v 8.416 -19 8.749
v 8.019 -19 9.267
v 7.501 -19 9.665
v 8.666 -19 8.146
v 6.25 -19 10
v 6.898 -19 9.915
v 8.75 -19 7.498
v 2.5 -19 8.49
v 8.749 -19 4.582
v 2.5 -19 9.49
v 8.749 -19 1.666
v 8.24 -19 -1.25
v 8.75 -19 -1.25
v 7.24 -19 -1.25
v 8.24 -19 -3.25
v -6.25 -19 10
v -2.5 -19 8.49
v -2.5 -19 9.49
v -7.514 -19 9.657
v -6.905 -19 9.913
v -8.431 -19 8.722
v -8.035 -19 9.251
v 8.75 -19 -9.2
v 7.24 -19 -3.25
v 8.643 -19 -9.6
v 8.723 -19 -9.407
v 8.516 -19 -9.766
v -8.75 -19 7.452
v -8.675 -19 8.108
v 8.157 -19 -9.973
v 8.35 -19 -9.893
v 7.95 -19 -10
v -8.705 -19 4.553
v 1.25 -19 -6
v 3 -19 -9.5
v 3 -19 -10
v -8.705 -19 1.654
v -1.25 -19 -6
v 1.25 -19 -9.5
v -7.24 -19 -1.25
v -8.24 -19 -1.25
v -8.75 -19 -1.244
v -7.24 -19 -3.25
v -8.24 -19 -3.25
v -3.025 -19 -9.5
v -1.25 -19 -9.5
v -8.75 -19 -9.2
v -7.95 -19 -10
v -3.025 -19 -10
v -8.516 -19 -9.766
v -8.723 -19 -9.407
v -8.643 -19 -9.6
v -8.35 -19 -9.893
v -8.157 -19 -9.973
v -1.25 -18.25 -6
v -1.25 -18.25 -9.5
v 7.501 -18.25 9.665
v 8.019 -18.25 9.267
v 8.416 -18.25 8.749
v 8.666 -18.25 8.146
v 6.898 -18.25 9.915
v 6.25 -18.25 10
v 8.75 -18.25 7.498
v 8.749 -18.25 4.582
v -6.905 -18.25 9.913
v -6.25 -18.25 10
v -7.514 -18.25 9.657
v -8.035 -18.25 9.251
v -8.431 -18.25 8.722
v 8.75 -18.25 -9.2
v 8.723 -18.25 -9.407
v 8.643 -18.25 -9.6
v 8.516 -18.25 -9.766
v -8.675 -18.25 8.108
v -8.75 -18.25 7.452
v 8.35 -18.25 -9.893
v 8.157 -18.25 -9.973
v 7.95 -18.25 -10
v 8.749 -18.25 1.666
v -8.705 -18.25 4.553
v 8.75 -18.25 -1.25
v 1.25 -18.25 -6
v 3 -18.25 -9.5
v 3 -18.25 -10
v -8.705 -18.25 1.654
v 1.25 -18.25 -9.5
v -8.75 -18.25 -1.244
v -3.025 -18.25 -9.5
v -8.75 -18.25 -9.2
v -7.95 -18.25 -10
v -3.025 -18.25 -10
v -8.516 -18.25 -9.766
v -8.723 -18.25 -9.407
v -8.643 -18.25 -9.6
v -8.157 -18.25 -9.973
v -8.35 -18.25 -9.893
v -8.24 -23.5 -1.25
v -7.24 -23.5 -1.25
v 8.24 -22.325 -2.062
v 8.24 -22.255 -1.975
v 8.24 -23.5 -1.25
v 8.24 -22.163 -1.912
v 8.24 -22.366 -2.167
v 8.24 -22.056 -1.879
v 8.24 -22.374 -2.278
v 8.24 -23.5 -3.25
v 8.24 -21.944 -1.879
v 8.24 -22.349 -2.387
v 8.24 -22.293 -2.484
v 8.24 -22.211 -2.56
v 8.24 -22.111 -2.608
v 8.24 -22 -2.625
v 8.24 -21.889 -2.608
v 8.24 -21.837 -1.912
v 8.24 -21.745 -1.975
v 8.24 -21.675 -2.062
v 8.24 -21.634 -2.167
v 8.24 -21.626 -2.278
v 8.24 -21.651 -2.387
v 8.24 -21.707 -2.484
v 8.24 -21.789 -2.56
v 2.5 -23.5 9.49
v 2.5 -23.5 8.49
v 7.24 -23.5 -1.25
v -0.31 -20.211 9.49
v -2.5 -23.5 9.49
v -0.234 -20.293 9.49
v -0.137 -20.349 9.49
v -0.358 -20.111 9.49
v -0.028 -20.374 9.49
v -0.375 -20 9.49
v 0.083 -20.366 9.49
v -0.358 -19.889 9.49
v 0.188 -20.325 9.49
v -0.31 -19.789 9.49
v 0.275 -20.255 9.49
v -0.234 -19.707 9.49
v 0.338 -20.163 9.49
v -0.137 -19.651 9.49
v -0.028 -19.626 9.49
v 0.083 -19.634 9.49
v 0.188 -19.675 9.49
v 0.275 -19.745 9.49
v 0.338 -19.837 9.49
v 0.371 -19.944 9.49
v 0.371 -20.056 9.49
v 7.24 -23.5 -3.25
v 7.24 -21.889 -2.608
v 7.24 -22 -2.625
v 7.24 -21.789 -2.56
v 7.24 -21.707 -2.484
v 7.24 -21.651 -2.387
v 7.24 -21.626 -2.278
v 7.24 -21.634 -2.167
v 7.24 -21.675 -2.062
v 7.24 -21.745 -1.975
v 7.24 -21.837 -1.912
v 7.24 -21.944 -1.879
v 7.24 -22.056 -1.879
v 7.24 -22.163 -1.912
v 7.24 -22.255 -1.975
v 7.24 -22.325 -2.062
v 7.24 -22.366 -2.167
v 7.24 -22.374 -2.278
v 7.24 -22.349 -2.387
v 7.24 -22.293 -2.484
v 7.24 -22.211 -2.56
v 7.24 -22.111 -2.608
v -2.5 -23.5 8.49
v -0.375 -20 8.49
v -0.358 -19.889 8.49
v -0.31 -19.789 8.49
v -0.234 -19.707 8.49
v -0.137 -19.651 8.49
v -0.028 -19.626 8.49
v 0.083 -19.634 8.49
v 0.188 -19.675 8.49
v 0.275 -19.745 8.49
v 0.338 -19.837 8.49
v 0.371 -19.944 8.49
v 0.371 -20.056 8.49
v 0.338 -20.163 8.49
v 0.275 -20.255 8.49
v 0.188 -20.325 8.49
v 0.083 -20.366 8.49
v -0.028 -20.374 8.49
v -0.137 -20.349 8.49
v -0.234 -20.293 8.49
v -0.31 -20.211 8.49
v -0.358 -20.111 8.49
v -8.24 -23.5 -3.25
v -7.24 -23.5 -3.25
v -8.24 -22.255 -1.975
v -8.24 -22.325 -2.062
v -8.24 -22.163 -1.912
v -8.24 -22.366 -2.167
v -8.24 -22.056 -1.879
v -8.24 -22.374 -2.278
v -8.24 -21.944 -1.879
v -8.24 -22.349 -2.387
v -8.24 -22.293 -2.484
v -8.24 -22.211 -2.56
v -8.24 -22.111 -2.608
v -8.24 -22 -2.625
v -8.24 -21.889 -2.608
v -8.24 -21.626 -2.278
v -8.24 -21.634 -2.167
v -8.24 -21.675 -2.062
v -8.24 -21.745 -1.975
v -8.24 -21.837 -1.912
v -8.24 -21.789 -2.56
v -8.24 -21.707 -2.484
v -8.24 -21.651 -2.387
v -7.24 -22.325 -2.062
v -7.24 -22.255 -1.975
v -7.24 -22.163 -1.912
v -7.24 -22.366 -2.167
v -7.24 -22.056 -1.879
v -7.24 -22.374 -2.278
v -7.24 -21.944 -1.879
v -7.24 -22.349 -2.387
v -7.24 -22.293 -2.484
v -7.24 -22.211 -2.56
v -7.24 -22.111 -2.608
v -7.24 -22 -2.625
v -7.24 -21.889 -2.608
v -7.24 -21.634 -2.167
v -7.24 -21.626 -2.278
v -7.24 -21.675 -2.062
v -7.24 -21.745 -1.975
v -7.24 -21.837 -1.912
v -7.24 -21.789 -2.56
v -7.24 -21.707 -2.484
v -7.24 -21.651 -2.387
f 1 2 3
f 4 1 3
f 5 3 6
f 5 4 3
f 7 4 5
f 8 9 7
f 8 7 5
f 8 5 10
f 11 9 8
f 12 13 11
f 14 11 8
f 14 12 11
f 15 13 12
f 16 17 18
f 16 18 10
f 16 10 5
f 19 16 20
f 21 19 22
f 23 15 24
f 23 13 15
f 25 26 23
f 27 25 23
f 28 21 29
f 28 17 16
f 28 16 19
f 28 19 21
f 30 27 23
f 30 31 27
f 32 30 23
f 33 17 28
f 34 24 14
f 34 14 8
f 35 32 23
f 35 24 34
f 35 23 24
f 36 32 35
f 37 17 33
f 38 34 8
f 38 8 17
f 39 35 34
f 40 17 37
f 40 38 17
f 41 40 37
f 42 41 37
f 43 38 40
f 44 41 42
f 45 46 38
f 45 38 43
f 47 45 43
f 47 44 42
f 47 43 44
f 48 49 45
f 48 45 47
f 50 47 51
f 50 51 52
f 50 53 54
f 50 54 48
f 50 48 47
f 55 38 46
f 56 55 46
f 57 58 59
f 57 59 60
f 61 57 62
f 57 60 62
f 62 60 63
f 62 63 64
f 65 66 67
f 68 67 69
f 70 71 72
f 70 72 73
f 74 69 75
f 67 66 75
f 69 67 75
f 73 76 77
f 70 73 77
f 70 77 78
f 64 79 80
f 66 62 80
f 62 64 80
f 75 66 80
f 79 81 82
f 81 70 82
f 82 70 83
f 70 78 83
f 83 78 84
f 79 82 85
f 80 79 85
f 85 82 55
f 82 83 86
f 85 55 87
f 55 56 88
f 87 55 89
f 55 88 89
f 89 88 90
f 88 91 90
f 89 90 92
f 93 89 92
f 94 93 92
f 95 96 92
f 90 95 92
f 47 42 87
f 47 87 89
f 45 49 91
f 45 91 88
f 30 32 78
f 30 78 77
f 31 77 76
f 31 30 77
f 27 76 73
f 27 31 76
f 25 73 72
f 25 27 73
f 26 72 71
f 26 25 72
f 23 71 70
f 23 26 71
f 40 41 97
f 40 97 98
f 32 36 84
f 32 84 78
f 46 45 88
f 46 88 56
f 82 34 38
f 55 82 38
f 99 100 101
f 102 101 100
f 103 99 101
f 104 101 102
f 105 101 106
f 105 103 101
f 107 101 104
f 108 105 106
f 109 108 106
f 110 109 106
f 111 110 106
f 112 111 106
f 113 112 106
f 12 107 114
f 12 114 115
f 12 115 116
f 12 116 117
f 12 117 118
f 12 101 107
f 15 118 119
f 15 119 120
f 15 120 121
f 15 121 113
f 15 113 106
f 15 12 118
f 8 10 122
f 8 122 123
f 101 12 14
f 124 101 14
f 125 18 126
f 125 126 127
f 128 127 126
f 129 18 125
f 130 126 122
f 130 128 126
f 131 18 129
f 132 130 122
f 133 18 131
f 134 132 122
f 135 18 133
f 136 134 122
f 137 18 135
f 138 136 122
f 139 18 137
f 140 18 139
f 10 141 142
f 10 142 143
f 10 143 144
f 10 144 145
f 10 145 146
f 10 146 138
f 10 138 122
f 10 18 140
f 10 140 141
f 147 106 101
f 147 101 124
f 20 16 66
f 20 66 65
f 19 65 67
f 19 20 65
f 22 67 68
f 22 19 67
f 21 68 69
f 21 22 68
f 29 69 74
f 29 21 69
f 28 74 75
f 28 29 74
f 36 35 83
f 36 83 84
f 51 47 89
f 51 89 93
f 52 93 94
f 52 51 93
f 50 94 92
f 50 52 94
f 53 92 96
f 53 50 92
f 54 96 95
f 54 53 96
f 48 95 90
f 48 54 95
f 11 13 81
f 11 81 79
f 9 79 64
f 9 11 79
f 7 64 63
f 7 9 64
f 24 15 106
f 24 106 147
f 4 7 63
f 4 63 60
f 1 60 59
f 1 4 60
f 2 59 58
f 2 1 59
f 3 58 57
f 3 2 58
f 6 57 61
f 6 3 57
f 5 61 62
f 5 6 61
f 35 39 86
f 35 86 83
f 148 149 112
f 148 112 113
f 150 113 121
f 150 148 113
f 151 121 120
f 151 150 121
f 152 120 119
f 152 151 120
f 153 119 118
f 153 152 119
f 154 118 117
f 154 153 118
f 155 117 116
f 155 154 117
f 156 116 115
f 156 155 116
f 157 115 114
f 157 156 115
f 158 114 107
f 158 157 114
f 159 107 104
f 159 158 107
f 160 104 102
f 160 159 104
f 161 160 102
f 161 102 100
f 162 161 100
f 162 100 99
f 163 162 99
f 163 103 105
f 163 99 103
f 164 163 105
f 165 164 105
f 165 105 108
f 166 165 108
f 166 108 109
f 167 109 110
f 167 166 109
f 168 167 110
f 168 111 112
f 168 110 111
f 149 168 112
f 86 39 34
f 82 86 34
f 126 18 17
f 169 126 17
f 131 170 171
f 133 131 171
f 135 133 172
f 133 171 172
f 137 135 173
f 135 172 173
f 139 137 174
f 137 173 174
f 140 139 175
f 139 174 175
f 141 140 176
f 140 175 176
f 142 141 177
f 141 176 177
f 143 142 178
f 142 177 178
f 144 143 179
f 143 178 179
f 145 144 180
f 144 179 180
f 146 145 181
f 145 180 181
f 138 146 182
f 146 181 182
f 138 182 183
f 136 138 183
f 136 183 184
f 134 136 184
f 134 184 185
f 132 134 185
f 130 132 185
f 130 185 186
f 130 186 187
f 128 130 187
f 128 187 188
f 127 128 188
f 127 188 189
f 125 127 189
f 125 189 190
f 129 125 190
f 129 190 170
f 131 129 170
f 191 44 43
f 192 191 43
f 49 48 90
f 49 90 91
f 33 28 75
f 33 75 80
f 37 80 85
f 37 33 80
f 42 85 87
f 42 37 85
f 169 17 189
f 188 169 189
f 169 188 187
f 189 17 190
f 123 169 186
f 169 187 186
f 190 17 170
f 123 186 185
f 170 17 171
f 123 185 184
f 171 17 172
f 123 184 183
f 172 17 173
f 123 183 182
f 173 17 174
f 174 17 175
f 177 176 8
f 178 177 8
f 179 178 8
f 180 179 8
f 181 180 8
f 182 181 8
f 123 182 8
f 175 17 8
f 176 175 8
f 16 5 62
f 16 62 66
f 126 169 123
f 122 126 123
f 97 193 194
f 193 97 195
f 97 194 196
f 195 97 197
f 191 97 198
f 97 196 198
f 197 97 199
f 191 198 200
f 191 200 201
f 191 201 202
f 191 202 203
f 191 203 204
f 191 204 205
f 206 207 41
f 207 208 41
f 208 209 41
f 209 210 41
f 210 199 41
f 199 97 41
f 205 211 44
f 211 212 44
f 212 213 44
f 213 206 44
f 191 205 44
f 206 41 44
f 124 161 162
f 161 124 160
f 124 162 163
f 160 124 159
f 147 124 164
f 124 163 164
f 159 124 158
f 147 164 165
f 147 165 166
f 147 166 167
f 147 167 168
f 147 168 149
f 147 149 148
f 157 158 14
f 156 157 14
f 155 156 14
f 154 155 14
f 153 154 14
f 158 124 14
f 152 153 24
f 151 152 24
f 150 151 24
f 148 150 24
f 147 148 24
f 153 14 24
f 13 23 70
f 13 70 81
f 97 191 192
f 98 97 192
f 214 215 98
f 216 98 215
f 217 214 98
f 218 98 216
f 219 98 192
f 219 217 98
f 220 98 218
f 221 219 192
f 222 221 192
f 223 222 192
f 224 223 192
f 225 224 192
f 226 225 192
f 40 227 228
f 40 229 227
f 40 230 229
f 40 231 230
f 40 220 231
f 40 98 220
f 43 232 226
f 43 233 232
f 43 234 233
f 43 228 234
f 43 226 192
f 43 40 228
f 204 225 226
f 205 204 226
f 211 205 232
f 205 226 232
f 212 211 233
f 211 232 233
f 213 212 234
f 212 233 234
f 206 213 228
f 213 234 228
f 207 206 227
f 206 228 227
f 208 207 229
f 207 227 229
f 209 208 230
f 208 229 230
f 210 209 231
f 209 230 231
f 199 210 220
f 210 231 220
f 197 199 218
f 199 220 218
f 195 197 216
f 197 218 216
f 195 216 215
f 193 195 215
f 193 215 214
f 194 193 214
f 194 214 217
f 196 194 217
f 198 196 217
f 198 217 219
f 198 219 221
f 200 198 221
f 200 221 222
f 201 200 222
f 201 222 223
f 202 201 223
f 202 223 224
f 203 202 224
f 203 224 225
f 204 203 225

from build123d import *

# Parameters (mm, degrees)
BOSS_EXTRUDE4_DEPTH    = 0.75
EXTRUDE_THIN2_DEPTH    = 0.75
UPPER_17_W             = 5
UPPER_17_H             = 1
UPPER_17_W_2           = 1
UPPER_17_H_2           = 2
LID_ANCHOR_FRONT_DEPTH = 4.5
TAP_LATERAL_LID_D      = 0.75
TAP_FRONT_LID_D        = 0.75
CUT_EXTRUDE1_REACH     = 16.029


with BuildPart() as part:
    # upper_13 → Boss-Extrude4 (new body)
    with BuildSketch(Plane(origin=(0, -19, 0), x_dir=(1, 0, 0), z_dir=(0, 1, 0))):
        with BuildLine():
            Line((-6.250353693, -9.5), (6.250353693, -9.5))
            ThreePointArc((6.250353693, -9.5), (7.665029054, -8.913751613), (8.250353267, -7.498693623))
            ThreePointArc((8.250353267, -7.498693623), (8.248836313, -3.124346866), (8.25, 1.25))
            Line((8.25, 1.25), (8.25, 9.2))
            ThreePointArc((8.25, 9.2), (8.162132034, 9.412132034), (7.95, 9.5))
            Line((7.95, 9.5), (1.25, 9.5))
            Line((1.25, 9.5), (1.25, 6))
            Line((1.25, 6), (-1.25, 6))
            Line((-1.25, 6), (-1.25, 9.5))
            Line((-1.25, 9.5), (-7.95, 9.5))
            ThreePointArc((-7.95, 9.5), (-8.162132034, 9.412132034), (-8.25, 9.2))
            Line((-8.25, 9.2), (-8.25, 1.25))
            ThreePointArc((-8.25, 1.25), (-8.199296345, -3.106194095), (-8.25, -7.462388189))
            ThreePointArc((-8.25, -7.462388189), (-7.677803101, -8.900852665), (-6.250353693, -9.5))
        make_face()
    extrude(amount=BOSS_EXTRUDE4_DEPTH)



with BuildPart() as body_2:
    # upper_16 → Extrude-Thin2 (new body)
    with BuildSketch(Plane(origin=(0, -19, 0), x_dir=(1, 0, 0), z_dir=(0, 1, 0))):
        with BuildLine():
            Line((-8.75, 1.244176388), (-8.75, 9.2))
            ThreePointArc((-8.75, 9.2), (-8.515685425, 9.765685425), (-7.95, 10))
            Line((-7.95, 10), (7.95, 10))
            ThreePointArc((7.95, 10), (8.515685425, 9.765685425), (8.75, 9.2))
            Line((8.75, 9.2), (8.75, 1.24985689))
            ThreePointArc((8.75, 1.24985689), (8.74883631, -3.124255124), (8.75035316, -7.498367029))
            ThreePointArc((8.75035316, -7.498367029), (8.018697895, -9.267189516), (6.250353693, -10))
            Line((6.250353693, -10), (-6.250353693, -10))
            ThreePointArc((-6.250353693, -10), (-8.035078913, -9.250644422), (-8.749889093, -7.451804713))
            ThreePointArc((-8.749889093, -7.451804713), (-8.69929636, -3.103813517), (-8.75, 1.244176388))
        make_face()
        with BuildLine():
            Line((-8.25, 1.25), (-8.25, 9.2))
            ThreePointArc((-8.25, 9.2), (-8.162132034, 9.412132034), (-7.95, 9.5))
            Line((-7.95, 9.5), (7.95, 9.5))
            ThreePointArc((7.95, 9.5), (8.162132034, 9.412132034), (8.25, 9.2))
            Line((8.25, 9.2), (8.25, 1.25))
            ThreePointArc((8.25, 1.25), (8.248836313, -3.124346866), (8.250353267, -7.498693623))
            ThreePointArc((8.250353267, -7.498693623), (7.665029054, -8.913751613), (6.250353693, -9.5))
            Line((6.250353693, -9.5), (-6.250353693, -9.5))
            ThreePointArc((-6.250353693, -9.5), (-7.677803101, -8.900852665), (-8.25, -7.462388189))
            ThreePointArc((-8.25, -7.462388189), (-8.199296345, -3.106194095), (-8.25, 1.25))
        make_face(mode=Mode.SUBTRACT)
    extrude(amount=EXTRUDE_THIN2_DEPTH)


with BuildPart() as part_1:
    add(part.part)

    add(body_2.part)  # lid_anchor_front merges body 2
    # upper_17 → lid_anchor_front (add)
    with BuildSketch(Plane(origin=(0, -19, 0), x_dir=(1, 0, 0), z_dir=(0, 1, 0))):
        with Locations((0, -8.99)):
            Rectangle(UPPER_17_W, UPPER_17_H)
        with Locations((-7.74, 2.25)):
            Rectangle(UPPER_17_W_2, UPPER_17_H_2)
    lid_anchor_front = extrude(amount=-LID_ANCHOR_FRONT_DEPTH)

    # tap_lateral_lid (through all)
    with Locations(Plane.ZY.offset(8.24)):
        with Locations((-2.25, -22)):
            tap_lateral_lid = Hole(TAP_LATERAL_LID_D / 2)

    # Mirror3: lid_anchor_front, tap_lateral_lid across plane
    add(lid_anchor_front.mirror(Plane(origin=(0, 0, 0), x_dir=(0, 0, 1), z_dir=(1, 0, 0))))
    add(tap_lateral_lid.mirror(Plane(origin=(0, 0, 0), x_dir=(0, 0, 1), z_dir=(1, 0, 0))), mode=Mode.SUBTRACT)

    # tap_front_lid (through all)
    with Locations(Plane.XY.offset(9.49)):
        with Locations((0, -20)):
            Hole(TAP_FRONT_LID_D / 2)

    # upper_18 → Cut-Extrude1 (cut, up to next)
    with BuildSketch(Plane(origin=(0, -19, 0), x_dir=(1, 0, 0), z_dir=(0, 1, 0)), mode=Mode.PRIVATE) as cut_extrude1_sk1:
        with BuildLine():
            ThreePointArc((-2.5, 9.5), (-1.767766953, 11.267766953), (0, 12))
            Line((0, 12), (-1.556624327, 12))
            Line((-1.556624327, 12), (-3, 9.5))
            Line((-3, 9.5), (-2.5, 9.5))
        make_face()
    cut_extrude1_tool1 = extrude(cut_extrude1_sk1.sketch, amount=CUT_EXTRUDE1_REACH, mode=Mode.PRIVATE) & part_1.part
    # upper_18 → Cut-Extrude1 (cut, up to next)
    with BuildSketch(Plane(origin=(0, -19, 0), x_dir=(1, 0, 0), z_dir=(0, 1, 0)), mode=Mode.PRIVATE) as cut_extrude1_sk2:
        with BuildLine():
            Line((2.5, 9.5), (3, 9.5))
            Line((3, 9.5), (1.556624327, 12))
            Line((1.556624327, 12), (0, 12))
            ThreePointArc((0, 12), (1.767766953, 11.267766953), (2.5, 9.5))
        make_face()
    cut_extrude1_tool2 = extrude(cut_extrude1_sk2.sketch, amount=CUT_EXTRUDE1_REACH, mode=Mode.PRIVATE) & part_1.part
    # upper_18 → Cut-Extrude1 (cut, up to next)
    with BuildSketch(Plane(origin=(0, -19, 0), x_dir=(1, 0, 0), z_dir=(0, 1, 0)), mode=Mode.PRIVATE) as cut_extrude1_sk3:
        with BuildLine():
            Line((1.25, 9.5), (2.5, 9.5))
            ThreePointArc((2.5, 9.5), (1.767766953, 11.267766953), (0, 12))
            ThreePointArc((0, 12), (-1.767766953, 11.267766953), (-2.5, 9.5))
            Line((-2.5, 9.5), (-1.25, 9.5))
            Line((-1.25, 9.5), (1.25, 9.5))
        make_face()
    cut_extrude1_tool3 = extrude(cut_extrude1_sk3.sketch, amount=CUT_EXTRUDE1_REACH, mode=Mode.PRIVATE) & part_1.part
    # upper_18 → Cut-Extrude1 (cut, up to next)
    with BuildSketch(Plane(origin=(0, -19, 0), x_dir=(1, 0, 0), z_dir=(0, 1, 0)), mode=Mode.PRIVATE) as cut_extrude1_sk4:
        Polygon((1.556624327, 12), (3, 9.5), (3, 12), align=None)
    cut_extrude1_tool4 = extrude(cut_extrude1_sk4.sketch, amount=CUT_EXTRUDE1_REACH, mode=Mode.PRIVATE) & part_1.part
    # upper_18 → Cut-Extrude1 (cut, up to next)
    with BuildSketch(Plane(origin=(0, -19, 0), x_dir=(1, 0, 0), z_dir=(0, 1, 0)), mode=Mode.PRIVATE) as cut_extrude1_sk5:
        Polygon((-3.025026025, 12), (-3.025026025, 9.5), (-3, 9.5), (-1.556624327, 12), align=None)
    cut_extrude1_tool5 = extrude(cut_extrude1_sk5.sketch, amount=CUT_EXTRUDE1_REACH, mode=Mode.PRIVATE) & part_1.part
    add(cut_extrude1_tool1.solids().sort_by_distance((-2.75, -19, -9.539051))[0], mode=Mode.SUBTRACT)
    add(cut_extrude1_tool2.solids().sort_by_distance((2.244493, -19, -10.730474))[0], mode=Mode.SUBTRACT)
    add(cut_extrude1_tool3.solids().sort_by_distance((0, -19, -10.561033))[0], mode=Mode.SUBTRACT)
    add(cut_extrude1_tool4.solids().sort_by_distance((2.518875, -19, -11.166667))[0], mode=Mode.SUBTRACT)
    add(cut_extrude1_tool5.solids().sort_by_distance((-2.535419, -19, -11.152702))[0], mode=Mode.SUBTRACT)


solid = part_1.part
